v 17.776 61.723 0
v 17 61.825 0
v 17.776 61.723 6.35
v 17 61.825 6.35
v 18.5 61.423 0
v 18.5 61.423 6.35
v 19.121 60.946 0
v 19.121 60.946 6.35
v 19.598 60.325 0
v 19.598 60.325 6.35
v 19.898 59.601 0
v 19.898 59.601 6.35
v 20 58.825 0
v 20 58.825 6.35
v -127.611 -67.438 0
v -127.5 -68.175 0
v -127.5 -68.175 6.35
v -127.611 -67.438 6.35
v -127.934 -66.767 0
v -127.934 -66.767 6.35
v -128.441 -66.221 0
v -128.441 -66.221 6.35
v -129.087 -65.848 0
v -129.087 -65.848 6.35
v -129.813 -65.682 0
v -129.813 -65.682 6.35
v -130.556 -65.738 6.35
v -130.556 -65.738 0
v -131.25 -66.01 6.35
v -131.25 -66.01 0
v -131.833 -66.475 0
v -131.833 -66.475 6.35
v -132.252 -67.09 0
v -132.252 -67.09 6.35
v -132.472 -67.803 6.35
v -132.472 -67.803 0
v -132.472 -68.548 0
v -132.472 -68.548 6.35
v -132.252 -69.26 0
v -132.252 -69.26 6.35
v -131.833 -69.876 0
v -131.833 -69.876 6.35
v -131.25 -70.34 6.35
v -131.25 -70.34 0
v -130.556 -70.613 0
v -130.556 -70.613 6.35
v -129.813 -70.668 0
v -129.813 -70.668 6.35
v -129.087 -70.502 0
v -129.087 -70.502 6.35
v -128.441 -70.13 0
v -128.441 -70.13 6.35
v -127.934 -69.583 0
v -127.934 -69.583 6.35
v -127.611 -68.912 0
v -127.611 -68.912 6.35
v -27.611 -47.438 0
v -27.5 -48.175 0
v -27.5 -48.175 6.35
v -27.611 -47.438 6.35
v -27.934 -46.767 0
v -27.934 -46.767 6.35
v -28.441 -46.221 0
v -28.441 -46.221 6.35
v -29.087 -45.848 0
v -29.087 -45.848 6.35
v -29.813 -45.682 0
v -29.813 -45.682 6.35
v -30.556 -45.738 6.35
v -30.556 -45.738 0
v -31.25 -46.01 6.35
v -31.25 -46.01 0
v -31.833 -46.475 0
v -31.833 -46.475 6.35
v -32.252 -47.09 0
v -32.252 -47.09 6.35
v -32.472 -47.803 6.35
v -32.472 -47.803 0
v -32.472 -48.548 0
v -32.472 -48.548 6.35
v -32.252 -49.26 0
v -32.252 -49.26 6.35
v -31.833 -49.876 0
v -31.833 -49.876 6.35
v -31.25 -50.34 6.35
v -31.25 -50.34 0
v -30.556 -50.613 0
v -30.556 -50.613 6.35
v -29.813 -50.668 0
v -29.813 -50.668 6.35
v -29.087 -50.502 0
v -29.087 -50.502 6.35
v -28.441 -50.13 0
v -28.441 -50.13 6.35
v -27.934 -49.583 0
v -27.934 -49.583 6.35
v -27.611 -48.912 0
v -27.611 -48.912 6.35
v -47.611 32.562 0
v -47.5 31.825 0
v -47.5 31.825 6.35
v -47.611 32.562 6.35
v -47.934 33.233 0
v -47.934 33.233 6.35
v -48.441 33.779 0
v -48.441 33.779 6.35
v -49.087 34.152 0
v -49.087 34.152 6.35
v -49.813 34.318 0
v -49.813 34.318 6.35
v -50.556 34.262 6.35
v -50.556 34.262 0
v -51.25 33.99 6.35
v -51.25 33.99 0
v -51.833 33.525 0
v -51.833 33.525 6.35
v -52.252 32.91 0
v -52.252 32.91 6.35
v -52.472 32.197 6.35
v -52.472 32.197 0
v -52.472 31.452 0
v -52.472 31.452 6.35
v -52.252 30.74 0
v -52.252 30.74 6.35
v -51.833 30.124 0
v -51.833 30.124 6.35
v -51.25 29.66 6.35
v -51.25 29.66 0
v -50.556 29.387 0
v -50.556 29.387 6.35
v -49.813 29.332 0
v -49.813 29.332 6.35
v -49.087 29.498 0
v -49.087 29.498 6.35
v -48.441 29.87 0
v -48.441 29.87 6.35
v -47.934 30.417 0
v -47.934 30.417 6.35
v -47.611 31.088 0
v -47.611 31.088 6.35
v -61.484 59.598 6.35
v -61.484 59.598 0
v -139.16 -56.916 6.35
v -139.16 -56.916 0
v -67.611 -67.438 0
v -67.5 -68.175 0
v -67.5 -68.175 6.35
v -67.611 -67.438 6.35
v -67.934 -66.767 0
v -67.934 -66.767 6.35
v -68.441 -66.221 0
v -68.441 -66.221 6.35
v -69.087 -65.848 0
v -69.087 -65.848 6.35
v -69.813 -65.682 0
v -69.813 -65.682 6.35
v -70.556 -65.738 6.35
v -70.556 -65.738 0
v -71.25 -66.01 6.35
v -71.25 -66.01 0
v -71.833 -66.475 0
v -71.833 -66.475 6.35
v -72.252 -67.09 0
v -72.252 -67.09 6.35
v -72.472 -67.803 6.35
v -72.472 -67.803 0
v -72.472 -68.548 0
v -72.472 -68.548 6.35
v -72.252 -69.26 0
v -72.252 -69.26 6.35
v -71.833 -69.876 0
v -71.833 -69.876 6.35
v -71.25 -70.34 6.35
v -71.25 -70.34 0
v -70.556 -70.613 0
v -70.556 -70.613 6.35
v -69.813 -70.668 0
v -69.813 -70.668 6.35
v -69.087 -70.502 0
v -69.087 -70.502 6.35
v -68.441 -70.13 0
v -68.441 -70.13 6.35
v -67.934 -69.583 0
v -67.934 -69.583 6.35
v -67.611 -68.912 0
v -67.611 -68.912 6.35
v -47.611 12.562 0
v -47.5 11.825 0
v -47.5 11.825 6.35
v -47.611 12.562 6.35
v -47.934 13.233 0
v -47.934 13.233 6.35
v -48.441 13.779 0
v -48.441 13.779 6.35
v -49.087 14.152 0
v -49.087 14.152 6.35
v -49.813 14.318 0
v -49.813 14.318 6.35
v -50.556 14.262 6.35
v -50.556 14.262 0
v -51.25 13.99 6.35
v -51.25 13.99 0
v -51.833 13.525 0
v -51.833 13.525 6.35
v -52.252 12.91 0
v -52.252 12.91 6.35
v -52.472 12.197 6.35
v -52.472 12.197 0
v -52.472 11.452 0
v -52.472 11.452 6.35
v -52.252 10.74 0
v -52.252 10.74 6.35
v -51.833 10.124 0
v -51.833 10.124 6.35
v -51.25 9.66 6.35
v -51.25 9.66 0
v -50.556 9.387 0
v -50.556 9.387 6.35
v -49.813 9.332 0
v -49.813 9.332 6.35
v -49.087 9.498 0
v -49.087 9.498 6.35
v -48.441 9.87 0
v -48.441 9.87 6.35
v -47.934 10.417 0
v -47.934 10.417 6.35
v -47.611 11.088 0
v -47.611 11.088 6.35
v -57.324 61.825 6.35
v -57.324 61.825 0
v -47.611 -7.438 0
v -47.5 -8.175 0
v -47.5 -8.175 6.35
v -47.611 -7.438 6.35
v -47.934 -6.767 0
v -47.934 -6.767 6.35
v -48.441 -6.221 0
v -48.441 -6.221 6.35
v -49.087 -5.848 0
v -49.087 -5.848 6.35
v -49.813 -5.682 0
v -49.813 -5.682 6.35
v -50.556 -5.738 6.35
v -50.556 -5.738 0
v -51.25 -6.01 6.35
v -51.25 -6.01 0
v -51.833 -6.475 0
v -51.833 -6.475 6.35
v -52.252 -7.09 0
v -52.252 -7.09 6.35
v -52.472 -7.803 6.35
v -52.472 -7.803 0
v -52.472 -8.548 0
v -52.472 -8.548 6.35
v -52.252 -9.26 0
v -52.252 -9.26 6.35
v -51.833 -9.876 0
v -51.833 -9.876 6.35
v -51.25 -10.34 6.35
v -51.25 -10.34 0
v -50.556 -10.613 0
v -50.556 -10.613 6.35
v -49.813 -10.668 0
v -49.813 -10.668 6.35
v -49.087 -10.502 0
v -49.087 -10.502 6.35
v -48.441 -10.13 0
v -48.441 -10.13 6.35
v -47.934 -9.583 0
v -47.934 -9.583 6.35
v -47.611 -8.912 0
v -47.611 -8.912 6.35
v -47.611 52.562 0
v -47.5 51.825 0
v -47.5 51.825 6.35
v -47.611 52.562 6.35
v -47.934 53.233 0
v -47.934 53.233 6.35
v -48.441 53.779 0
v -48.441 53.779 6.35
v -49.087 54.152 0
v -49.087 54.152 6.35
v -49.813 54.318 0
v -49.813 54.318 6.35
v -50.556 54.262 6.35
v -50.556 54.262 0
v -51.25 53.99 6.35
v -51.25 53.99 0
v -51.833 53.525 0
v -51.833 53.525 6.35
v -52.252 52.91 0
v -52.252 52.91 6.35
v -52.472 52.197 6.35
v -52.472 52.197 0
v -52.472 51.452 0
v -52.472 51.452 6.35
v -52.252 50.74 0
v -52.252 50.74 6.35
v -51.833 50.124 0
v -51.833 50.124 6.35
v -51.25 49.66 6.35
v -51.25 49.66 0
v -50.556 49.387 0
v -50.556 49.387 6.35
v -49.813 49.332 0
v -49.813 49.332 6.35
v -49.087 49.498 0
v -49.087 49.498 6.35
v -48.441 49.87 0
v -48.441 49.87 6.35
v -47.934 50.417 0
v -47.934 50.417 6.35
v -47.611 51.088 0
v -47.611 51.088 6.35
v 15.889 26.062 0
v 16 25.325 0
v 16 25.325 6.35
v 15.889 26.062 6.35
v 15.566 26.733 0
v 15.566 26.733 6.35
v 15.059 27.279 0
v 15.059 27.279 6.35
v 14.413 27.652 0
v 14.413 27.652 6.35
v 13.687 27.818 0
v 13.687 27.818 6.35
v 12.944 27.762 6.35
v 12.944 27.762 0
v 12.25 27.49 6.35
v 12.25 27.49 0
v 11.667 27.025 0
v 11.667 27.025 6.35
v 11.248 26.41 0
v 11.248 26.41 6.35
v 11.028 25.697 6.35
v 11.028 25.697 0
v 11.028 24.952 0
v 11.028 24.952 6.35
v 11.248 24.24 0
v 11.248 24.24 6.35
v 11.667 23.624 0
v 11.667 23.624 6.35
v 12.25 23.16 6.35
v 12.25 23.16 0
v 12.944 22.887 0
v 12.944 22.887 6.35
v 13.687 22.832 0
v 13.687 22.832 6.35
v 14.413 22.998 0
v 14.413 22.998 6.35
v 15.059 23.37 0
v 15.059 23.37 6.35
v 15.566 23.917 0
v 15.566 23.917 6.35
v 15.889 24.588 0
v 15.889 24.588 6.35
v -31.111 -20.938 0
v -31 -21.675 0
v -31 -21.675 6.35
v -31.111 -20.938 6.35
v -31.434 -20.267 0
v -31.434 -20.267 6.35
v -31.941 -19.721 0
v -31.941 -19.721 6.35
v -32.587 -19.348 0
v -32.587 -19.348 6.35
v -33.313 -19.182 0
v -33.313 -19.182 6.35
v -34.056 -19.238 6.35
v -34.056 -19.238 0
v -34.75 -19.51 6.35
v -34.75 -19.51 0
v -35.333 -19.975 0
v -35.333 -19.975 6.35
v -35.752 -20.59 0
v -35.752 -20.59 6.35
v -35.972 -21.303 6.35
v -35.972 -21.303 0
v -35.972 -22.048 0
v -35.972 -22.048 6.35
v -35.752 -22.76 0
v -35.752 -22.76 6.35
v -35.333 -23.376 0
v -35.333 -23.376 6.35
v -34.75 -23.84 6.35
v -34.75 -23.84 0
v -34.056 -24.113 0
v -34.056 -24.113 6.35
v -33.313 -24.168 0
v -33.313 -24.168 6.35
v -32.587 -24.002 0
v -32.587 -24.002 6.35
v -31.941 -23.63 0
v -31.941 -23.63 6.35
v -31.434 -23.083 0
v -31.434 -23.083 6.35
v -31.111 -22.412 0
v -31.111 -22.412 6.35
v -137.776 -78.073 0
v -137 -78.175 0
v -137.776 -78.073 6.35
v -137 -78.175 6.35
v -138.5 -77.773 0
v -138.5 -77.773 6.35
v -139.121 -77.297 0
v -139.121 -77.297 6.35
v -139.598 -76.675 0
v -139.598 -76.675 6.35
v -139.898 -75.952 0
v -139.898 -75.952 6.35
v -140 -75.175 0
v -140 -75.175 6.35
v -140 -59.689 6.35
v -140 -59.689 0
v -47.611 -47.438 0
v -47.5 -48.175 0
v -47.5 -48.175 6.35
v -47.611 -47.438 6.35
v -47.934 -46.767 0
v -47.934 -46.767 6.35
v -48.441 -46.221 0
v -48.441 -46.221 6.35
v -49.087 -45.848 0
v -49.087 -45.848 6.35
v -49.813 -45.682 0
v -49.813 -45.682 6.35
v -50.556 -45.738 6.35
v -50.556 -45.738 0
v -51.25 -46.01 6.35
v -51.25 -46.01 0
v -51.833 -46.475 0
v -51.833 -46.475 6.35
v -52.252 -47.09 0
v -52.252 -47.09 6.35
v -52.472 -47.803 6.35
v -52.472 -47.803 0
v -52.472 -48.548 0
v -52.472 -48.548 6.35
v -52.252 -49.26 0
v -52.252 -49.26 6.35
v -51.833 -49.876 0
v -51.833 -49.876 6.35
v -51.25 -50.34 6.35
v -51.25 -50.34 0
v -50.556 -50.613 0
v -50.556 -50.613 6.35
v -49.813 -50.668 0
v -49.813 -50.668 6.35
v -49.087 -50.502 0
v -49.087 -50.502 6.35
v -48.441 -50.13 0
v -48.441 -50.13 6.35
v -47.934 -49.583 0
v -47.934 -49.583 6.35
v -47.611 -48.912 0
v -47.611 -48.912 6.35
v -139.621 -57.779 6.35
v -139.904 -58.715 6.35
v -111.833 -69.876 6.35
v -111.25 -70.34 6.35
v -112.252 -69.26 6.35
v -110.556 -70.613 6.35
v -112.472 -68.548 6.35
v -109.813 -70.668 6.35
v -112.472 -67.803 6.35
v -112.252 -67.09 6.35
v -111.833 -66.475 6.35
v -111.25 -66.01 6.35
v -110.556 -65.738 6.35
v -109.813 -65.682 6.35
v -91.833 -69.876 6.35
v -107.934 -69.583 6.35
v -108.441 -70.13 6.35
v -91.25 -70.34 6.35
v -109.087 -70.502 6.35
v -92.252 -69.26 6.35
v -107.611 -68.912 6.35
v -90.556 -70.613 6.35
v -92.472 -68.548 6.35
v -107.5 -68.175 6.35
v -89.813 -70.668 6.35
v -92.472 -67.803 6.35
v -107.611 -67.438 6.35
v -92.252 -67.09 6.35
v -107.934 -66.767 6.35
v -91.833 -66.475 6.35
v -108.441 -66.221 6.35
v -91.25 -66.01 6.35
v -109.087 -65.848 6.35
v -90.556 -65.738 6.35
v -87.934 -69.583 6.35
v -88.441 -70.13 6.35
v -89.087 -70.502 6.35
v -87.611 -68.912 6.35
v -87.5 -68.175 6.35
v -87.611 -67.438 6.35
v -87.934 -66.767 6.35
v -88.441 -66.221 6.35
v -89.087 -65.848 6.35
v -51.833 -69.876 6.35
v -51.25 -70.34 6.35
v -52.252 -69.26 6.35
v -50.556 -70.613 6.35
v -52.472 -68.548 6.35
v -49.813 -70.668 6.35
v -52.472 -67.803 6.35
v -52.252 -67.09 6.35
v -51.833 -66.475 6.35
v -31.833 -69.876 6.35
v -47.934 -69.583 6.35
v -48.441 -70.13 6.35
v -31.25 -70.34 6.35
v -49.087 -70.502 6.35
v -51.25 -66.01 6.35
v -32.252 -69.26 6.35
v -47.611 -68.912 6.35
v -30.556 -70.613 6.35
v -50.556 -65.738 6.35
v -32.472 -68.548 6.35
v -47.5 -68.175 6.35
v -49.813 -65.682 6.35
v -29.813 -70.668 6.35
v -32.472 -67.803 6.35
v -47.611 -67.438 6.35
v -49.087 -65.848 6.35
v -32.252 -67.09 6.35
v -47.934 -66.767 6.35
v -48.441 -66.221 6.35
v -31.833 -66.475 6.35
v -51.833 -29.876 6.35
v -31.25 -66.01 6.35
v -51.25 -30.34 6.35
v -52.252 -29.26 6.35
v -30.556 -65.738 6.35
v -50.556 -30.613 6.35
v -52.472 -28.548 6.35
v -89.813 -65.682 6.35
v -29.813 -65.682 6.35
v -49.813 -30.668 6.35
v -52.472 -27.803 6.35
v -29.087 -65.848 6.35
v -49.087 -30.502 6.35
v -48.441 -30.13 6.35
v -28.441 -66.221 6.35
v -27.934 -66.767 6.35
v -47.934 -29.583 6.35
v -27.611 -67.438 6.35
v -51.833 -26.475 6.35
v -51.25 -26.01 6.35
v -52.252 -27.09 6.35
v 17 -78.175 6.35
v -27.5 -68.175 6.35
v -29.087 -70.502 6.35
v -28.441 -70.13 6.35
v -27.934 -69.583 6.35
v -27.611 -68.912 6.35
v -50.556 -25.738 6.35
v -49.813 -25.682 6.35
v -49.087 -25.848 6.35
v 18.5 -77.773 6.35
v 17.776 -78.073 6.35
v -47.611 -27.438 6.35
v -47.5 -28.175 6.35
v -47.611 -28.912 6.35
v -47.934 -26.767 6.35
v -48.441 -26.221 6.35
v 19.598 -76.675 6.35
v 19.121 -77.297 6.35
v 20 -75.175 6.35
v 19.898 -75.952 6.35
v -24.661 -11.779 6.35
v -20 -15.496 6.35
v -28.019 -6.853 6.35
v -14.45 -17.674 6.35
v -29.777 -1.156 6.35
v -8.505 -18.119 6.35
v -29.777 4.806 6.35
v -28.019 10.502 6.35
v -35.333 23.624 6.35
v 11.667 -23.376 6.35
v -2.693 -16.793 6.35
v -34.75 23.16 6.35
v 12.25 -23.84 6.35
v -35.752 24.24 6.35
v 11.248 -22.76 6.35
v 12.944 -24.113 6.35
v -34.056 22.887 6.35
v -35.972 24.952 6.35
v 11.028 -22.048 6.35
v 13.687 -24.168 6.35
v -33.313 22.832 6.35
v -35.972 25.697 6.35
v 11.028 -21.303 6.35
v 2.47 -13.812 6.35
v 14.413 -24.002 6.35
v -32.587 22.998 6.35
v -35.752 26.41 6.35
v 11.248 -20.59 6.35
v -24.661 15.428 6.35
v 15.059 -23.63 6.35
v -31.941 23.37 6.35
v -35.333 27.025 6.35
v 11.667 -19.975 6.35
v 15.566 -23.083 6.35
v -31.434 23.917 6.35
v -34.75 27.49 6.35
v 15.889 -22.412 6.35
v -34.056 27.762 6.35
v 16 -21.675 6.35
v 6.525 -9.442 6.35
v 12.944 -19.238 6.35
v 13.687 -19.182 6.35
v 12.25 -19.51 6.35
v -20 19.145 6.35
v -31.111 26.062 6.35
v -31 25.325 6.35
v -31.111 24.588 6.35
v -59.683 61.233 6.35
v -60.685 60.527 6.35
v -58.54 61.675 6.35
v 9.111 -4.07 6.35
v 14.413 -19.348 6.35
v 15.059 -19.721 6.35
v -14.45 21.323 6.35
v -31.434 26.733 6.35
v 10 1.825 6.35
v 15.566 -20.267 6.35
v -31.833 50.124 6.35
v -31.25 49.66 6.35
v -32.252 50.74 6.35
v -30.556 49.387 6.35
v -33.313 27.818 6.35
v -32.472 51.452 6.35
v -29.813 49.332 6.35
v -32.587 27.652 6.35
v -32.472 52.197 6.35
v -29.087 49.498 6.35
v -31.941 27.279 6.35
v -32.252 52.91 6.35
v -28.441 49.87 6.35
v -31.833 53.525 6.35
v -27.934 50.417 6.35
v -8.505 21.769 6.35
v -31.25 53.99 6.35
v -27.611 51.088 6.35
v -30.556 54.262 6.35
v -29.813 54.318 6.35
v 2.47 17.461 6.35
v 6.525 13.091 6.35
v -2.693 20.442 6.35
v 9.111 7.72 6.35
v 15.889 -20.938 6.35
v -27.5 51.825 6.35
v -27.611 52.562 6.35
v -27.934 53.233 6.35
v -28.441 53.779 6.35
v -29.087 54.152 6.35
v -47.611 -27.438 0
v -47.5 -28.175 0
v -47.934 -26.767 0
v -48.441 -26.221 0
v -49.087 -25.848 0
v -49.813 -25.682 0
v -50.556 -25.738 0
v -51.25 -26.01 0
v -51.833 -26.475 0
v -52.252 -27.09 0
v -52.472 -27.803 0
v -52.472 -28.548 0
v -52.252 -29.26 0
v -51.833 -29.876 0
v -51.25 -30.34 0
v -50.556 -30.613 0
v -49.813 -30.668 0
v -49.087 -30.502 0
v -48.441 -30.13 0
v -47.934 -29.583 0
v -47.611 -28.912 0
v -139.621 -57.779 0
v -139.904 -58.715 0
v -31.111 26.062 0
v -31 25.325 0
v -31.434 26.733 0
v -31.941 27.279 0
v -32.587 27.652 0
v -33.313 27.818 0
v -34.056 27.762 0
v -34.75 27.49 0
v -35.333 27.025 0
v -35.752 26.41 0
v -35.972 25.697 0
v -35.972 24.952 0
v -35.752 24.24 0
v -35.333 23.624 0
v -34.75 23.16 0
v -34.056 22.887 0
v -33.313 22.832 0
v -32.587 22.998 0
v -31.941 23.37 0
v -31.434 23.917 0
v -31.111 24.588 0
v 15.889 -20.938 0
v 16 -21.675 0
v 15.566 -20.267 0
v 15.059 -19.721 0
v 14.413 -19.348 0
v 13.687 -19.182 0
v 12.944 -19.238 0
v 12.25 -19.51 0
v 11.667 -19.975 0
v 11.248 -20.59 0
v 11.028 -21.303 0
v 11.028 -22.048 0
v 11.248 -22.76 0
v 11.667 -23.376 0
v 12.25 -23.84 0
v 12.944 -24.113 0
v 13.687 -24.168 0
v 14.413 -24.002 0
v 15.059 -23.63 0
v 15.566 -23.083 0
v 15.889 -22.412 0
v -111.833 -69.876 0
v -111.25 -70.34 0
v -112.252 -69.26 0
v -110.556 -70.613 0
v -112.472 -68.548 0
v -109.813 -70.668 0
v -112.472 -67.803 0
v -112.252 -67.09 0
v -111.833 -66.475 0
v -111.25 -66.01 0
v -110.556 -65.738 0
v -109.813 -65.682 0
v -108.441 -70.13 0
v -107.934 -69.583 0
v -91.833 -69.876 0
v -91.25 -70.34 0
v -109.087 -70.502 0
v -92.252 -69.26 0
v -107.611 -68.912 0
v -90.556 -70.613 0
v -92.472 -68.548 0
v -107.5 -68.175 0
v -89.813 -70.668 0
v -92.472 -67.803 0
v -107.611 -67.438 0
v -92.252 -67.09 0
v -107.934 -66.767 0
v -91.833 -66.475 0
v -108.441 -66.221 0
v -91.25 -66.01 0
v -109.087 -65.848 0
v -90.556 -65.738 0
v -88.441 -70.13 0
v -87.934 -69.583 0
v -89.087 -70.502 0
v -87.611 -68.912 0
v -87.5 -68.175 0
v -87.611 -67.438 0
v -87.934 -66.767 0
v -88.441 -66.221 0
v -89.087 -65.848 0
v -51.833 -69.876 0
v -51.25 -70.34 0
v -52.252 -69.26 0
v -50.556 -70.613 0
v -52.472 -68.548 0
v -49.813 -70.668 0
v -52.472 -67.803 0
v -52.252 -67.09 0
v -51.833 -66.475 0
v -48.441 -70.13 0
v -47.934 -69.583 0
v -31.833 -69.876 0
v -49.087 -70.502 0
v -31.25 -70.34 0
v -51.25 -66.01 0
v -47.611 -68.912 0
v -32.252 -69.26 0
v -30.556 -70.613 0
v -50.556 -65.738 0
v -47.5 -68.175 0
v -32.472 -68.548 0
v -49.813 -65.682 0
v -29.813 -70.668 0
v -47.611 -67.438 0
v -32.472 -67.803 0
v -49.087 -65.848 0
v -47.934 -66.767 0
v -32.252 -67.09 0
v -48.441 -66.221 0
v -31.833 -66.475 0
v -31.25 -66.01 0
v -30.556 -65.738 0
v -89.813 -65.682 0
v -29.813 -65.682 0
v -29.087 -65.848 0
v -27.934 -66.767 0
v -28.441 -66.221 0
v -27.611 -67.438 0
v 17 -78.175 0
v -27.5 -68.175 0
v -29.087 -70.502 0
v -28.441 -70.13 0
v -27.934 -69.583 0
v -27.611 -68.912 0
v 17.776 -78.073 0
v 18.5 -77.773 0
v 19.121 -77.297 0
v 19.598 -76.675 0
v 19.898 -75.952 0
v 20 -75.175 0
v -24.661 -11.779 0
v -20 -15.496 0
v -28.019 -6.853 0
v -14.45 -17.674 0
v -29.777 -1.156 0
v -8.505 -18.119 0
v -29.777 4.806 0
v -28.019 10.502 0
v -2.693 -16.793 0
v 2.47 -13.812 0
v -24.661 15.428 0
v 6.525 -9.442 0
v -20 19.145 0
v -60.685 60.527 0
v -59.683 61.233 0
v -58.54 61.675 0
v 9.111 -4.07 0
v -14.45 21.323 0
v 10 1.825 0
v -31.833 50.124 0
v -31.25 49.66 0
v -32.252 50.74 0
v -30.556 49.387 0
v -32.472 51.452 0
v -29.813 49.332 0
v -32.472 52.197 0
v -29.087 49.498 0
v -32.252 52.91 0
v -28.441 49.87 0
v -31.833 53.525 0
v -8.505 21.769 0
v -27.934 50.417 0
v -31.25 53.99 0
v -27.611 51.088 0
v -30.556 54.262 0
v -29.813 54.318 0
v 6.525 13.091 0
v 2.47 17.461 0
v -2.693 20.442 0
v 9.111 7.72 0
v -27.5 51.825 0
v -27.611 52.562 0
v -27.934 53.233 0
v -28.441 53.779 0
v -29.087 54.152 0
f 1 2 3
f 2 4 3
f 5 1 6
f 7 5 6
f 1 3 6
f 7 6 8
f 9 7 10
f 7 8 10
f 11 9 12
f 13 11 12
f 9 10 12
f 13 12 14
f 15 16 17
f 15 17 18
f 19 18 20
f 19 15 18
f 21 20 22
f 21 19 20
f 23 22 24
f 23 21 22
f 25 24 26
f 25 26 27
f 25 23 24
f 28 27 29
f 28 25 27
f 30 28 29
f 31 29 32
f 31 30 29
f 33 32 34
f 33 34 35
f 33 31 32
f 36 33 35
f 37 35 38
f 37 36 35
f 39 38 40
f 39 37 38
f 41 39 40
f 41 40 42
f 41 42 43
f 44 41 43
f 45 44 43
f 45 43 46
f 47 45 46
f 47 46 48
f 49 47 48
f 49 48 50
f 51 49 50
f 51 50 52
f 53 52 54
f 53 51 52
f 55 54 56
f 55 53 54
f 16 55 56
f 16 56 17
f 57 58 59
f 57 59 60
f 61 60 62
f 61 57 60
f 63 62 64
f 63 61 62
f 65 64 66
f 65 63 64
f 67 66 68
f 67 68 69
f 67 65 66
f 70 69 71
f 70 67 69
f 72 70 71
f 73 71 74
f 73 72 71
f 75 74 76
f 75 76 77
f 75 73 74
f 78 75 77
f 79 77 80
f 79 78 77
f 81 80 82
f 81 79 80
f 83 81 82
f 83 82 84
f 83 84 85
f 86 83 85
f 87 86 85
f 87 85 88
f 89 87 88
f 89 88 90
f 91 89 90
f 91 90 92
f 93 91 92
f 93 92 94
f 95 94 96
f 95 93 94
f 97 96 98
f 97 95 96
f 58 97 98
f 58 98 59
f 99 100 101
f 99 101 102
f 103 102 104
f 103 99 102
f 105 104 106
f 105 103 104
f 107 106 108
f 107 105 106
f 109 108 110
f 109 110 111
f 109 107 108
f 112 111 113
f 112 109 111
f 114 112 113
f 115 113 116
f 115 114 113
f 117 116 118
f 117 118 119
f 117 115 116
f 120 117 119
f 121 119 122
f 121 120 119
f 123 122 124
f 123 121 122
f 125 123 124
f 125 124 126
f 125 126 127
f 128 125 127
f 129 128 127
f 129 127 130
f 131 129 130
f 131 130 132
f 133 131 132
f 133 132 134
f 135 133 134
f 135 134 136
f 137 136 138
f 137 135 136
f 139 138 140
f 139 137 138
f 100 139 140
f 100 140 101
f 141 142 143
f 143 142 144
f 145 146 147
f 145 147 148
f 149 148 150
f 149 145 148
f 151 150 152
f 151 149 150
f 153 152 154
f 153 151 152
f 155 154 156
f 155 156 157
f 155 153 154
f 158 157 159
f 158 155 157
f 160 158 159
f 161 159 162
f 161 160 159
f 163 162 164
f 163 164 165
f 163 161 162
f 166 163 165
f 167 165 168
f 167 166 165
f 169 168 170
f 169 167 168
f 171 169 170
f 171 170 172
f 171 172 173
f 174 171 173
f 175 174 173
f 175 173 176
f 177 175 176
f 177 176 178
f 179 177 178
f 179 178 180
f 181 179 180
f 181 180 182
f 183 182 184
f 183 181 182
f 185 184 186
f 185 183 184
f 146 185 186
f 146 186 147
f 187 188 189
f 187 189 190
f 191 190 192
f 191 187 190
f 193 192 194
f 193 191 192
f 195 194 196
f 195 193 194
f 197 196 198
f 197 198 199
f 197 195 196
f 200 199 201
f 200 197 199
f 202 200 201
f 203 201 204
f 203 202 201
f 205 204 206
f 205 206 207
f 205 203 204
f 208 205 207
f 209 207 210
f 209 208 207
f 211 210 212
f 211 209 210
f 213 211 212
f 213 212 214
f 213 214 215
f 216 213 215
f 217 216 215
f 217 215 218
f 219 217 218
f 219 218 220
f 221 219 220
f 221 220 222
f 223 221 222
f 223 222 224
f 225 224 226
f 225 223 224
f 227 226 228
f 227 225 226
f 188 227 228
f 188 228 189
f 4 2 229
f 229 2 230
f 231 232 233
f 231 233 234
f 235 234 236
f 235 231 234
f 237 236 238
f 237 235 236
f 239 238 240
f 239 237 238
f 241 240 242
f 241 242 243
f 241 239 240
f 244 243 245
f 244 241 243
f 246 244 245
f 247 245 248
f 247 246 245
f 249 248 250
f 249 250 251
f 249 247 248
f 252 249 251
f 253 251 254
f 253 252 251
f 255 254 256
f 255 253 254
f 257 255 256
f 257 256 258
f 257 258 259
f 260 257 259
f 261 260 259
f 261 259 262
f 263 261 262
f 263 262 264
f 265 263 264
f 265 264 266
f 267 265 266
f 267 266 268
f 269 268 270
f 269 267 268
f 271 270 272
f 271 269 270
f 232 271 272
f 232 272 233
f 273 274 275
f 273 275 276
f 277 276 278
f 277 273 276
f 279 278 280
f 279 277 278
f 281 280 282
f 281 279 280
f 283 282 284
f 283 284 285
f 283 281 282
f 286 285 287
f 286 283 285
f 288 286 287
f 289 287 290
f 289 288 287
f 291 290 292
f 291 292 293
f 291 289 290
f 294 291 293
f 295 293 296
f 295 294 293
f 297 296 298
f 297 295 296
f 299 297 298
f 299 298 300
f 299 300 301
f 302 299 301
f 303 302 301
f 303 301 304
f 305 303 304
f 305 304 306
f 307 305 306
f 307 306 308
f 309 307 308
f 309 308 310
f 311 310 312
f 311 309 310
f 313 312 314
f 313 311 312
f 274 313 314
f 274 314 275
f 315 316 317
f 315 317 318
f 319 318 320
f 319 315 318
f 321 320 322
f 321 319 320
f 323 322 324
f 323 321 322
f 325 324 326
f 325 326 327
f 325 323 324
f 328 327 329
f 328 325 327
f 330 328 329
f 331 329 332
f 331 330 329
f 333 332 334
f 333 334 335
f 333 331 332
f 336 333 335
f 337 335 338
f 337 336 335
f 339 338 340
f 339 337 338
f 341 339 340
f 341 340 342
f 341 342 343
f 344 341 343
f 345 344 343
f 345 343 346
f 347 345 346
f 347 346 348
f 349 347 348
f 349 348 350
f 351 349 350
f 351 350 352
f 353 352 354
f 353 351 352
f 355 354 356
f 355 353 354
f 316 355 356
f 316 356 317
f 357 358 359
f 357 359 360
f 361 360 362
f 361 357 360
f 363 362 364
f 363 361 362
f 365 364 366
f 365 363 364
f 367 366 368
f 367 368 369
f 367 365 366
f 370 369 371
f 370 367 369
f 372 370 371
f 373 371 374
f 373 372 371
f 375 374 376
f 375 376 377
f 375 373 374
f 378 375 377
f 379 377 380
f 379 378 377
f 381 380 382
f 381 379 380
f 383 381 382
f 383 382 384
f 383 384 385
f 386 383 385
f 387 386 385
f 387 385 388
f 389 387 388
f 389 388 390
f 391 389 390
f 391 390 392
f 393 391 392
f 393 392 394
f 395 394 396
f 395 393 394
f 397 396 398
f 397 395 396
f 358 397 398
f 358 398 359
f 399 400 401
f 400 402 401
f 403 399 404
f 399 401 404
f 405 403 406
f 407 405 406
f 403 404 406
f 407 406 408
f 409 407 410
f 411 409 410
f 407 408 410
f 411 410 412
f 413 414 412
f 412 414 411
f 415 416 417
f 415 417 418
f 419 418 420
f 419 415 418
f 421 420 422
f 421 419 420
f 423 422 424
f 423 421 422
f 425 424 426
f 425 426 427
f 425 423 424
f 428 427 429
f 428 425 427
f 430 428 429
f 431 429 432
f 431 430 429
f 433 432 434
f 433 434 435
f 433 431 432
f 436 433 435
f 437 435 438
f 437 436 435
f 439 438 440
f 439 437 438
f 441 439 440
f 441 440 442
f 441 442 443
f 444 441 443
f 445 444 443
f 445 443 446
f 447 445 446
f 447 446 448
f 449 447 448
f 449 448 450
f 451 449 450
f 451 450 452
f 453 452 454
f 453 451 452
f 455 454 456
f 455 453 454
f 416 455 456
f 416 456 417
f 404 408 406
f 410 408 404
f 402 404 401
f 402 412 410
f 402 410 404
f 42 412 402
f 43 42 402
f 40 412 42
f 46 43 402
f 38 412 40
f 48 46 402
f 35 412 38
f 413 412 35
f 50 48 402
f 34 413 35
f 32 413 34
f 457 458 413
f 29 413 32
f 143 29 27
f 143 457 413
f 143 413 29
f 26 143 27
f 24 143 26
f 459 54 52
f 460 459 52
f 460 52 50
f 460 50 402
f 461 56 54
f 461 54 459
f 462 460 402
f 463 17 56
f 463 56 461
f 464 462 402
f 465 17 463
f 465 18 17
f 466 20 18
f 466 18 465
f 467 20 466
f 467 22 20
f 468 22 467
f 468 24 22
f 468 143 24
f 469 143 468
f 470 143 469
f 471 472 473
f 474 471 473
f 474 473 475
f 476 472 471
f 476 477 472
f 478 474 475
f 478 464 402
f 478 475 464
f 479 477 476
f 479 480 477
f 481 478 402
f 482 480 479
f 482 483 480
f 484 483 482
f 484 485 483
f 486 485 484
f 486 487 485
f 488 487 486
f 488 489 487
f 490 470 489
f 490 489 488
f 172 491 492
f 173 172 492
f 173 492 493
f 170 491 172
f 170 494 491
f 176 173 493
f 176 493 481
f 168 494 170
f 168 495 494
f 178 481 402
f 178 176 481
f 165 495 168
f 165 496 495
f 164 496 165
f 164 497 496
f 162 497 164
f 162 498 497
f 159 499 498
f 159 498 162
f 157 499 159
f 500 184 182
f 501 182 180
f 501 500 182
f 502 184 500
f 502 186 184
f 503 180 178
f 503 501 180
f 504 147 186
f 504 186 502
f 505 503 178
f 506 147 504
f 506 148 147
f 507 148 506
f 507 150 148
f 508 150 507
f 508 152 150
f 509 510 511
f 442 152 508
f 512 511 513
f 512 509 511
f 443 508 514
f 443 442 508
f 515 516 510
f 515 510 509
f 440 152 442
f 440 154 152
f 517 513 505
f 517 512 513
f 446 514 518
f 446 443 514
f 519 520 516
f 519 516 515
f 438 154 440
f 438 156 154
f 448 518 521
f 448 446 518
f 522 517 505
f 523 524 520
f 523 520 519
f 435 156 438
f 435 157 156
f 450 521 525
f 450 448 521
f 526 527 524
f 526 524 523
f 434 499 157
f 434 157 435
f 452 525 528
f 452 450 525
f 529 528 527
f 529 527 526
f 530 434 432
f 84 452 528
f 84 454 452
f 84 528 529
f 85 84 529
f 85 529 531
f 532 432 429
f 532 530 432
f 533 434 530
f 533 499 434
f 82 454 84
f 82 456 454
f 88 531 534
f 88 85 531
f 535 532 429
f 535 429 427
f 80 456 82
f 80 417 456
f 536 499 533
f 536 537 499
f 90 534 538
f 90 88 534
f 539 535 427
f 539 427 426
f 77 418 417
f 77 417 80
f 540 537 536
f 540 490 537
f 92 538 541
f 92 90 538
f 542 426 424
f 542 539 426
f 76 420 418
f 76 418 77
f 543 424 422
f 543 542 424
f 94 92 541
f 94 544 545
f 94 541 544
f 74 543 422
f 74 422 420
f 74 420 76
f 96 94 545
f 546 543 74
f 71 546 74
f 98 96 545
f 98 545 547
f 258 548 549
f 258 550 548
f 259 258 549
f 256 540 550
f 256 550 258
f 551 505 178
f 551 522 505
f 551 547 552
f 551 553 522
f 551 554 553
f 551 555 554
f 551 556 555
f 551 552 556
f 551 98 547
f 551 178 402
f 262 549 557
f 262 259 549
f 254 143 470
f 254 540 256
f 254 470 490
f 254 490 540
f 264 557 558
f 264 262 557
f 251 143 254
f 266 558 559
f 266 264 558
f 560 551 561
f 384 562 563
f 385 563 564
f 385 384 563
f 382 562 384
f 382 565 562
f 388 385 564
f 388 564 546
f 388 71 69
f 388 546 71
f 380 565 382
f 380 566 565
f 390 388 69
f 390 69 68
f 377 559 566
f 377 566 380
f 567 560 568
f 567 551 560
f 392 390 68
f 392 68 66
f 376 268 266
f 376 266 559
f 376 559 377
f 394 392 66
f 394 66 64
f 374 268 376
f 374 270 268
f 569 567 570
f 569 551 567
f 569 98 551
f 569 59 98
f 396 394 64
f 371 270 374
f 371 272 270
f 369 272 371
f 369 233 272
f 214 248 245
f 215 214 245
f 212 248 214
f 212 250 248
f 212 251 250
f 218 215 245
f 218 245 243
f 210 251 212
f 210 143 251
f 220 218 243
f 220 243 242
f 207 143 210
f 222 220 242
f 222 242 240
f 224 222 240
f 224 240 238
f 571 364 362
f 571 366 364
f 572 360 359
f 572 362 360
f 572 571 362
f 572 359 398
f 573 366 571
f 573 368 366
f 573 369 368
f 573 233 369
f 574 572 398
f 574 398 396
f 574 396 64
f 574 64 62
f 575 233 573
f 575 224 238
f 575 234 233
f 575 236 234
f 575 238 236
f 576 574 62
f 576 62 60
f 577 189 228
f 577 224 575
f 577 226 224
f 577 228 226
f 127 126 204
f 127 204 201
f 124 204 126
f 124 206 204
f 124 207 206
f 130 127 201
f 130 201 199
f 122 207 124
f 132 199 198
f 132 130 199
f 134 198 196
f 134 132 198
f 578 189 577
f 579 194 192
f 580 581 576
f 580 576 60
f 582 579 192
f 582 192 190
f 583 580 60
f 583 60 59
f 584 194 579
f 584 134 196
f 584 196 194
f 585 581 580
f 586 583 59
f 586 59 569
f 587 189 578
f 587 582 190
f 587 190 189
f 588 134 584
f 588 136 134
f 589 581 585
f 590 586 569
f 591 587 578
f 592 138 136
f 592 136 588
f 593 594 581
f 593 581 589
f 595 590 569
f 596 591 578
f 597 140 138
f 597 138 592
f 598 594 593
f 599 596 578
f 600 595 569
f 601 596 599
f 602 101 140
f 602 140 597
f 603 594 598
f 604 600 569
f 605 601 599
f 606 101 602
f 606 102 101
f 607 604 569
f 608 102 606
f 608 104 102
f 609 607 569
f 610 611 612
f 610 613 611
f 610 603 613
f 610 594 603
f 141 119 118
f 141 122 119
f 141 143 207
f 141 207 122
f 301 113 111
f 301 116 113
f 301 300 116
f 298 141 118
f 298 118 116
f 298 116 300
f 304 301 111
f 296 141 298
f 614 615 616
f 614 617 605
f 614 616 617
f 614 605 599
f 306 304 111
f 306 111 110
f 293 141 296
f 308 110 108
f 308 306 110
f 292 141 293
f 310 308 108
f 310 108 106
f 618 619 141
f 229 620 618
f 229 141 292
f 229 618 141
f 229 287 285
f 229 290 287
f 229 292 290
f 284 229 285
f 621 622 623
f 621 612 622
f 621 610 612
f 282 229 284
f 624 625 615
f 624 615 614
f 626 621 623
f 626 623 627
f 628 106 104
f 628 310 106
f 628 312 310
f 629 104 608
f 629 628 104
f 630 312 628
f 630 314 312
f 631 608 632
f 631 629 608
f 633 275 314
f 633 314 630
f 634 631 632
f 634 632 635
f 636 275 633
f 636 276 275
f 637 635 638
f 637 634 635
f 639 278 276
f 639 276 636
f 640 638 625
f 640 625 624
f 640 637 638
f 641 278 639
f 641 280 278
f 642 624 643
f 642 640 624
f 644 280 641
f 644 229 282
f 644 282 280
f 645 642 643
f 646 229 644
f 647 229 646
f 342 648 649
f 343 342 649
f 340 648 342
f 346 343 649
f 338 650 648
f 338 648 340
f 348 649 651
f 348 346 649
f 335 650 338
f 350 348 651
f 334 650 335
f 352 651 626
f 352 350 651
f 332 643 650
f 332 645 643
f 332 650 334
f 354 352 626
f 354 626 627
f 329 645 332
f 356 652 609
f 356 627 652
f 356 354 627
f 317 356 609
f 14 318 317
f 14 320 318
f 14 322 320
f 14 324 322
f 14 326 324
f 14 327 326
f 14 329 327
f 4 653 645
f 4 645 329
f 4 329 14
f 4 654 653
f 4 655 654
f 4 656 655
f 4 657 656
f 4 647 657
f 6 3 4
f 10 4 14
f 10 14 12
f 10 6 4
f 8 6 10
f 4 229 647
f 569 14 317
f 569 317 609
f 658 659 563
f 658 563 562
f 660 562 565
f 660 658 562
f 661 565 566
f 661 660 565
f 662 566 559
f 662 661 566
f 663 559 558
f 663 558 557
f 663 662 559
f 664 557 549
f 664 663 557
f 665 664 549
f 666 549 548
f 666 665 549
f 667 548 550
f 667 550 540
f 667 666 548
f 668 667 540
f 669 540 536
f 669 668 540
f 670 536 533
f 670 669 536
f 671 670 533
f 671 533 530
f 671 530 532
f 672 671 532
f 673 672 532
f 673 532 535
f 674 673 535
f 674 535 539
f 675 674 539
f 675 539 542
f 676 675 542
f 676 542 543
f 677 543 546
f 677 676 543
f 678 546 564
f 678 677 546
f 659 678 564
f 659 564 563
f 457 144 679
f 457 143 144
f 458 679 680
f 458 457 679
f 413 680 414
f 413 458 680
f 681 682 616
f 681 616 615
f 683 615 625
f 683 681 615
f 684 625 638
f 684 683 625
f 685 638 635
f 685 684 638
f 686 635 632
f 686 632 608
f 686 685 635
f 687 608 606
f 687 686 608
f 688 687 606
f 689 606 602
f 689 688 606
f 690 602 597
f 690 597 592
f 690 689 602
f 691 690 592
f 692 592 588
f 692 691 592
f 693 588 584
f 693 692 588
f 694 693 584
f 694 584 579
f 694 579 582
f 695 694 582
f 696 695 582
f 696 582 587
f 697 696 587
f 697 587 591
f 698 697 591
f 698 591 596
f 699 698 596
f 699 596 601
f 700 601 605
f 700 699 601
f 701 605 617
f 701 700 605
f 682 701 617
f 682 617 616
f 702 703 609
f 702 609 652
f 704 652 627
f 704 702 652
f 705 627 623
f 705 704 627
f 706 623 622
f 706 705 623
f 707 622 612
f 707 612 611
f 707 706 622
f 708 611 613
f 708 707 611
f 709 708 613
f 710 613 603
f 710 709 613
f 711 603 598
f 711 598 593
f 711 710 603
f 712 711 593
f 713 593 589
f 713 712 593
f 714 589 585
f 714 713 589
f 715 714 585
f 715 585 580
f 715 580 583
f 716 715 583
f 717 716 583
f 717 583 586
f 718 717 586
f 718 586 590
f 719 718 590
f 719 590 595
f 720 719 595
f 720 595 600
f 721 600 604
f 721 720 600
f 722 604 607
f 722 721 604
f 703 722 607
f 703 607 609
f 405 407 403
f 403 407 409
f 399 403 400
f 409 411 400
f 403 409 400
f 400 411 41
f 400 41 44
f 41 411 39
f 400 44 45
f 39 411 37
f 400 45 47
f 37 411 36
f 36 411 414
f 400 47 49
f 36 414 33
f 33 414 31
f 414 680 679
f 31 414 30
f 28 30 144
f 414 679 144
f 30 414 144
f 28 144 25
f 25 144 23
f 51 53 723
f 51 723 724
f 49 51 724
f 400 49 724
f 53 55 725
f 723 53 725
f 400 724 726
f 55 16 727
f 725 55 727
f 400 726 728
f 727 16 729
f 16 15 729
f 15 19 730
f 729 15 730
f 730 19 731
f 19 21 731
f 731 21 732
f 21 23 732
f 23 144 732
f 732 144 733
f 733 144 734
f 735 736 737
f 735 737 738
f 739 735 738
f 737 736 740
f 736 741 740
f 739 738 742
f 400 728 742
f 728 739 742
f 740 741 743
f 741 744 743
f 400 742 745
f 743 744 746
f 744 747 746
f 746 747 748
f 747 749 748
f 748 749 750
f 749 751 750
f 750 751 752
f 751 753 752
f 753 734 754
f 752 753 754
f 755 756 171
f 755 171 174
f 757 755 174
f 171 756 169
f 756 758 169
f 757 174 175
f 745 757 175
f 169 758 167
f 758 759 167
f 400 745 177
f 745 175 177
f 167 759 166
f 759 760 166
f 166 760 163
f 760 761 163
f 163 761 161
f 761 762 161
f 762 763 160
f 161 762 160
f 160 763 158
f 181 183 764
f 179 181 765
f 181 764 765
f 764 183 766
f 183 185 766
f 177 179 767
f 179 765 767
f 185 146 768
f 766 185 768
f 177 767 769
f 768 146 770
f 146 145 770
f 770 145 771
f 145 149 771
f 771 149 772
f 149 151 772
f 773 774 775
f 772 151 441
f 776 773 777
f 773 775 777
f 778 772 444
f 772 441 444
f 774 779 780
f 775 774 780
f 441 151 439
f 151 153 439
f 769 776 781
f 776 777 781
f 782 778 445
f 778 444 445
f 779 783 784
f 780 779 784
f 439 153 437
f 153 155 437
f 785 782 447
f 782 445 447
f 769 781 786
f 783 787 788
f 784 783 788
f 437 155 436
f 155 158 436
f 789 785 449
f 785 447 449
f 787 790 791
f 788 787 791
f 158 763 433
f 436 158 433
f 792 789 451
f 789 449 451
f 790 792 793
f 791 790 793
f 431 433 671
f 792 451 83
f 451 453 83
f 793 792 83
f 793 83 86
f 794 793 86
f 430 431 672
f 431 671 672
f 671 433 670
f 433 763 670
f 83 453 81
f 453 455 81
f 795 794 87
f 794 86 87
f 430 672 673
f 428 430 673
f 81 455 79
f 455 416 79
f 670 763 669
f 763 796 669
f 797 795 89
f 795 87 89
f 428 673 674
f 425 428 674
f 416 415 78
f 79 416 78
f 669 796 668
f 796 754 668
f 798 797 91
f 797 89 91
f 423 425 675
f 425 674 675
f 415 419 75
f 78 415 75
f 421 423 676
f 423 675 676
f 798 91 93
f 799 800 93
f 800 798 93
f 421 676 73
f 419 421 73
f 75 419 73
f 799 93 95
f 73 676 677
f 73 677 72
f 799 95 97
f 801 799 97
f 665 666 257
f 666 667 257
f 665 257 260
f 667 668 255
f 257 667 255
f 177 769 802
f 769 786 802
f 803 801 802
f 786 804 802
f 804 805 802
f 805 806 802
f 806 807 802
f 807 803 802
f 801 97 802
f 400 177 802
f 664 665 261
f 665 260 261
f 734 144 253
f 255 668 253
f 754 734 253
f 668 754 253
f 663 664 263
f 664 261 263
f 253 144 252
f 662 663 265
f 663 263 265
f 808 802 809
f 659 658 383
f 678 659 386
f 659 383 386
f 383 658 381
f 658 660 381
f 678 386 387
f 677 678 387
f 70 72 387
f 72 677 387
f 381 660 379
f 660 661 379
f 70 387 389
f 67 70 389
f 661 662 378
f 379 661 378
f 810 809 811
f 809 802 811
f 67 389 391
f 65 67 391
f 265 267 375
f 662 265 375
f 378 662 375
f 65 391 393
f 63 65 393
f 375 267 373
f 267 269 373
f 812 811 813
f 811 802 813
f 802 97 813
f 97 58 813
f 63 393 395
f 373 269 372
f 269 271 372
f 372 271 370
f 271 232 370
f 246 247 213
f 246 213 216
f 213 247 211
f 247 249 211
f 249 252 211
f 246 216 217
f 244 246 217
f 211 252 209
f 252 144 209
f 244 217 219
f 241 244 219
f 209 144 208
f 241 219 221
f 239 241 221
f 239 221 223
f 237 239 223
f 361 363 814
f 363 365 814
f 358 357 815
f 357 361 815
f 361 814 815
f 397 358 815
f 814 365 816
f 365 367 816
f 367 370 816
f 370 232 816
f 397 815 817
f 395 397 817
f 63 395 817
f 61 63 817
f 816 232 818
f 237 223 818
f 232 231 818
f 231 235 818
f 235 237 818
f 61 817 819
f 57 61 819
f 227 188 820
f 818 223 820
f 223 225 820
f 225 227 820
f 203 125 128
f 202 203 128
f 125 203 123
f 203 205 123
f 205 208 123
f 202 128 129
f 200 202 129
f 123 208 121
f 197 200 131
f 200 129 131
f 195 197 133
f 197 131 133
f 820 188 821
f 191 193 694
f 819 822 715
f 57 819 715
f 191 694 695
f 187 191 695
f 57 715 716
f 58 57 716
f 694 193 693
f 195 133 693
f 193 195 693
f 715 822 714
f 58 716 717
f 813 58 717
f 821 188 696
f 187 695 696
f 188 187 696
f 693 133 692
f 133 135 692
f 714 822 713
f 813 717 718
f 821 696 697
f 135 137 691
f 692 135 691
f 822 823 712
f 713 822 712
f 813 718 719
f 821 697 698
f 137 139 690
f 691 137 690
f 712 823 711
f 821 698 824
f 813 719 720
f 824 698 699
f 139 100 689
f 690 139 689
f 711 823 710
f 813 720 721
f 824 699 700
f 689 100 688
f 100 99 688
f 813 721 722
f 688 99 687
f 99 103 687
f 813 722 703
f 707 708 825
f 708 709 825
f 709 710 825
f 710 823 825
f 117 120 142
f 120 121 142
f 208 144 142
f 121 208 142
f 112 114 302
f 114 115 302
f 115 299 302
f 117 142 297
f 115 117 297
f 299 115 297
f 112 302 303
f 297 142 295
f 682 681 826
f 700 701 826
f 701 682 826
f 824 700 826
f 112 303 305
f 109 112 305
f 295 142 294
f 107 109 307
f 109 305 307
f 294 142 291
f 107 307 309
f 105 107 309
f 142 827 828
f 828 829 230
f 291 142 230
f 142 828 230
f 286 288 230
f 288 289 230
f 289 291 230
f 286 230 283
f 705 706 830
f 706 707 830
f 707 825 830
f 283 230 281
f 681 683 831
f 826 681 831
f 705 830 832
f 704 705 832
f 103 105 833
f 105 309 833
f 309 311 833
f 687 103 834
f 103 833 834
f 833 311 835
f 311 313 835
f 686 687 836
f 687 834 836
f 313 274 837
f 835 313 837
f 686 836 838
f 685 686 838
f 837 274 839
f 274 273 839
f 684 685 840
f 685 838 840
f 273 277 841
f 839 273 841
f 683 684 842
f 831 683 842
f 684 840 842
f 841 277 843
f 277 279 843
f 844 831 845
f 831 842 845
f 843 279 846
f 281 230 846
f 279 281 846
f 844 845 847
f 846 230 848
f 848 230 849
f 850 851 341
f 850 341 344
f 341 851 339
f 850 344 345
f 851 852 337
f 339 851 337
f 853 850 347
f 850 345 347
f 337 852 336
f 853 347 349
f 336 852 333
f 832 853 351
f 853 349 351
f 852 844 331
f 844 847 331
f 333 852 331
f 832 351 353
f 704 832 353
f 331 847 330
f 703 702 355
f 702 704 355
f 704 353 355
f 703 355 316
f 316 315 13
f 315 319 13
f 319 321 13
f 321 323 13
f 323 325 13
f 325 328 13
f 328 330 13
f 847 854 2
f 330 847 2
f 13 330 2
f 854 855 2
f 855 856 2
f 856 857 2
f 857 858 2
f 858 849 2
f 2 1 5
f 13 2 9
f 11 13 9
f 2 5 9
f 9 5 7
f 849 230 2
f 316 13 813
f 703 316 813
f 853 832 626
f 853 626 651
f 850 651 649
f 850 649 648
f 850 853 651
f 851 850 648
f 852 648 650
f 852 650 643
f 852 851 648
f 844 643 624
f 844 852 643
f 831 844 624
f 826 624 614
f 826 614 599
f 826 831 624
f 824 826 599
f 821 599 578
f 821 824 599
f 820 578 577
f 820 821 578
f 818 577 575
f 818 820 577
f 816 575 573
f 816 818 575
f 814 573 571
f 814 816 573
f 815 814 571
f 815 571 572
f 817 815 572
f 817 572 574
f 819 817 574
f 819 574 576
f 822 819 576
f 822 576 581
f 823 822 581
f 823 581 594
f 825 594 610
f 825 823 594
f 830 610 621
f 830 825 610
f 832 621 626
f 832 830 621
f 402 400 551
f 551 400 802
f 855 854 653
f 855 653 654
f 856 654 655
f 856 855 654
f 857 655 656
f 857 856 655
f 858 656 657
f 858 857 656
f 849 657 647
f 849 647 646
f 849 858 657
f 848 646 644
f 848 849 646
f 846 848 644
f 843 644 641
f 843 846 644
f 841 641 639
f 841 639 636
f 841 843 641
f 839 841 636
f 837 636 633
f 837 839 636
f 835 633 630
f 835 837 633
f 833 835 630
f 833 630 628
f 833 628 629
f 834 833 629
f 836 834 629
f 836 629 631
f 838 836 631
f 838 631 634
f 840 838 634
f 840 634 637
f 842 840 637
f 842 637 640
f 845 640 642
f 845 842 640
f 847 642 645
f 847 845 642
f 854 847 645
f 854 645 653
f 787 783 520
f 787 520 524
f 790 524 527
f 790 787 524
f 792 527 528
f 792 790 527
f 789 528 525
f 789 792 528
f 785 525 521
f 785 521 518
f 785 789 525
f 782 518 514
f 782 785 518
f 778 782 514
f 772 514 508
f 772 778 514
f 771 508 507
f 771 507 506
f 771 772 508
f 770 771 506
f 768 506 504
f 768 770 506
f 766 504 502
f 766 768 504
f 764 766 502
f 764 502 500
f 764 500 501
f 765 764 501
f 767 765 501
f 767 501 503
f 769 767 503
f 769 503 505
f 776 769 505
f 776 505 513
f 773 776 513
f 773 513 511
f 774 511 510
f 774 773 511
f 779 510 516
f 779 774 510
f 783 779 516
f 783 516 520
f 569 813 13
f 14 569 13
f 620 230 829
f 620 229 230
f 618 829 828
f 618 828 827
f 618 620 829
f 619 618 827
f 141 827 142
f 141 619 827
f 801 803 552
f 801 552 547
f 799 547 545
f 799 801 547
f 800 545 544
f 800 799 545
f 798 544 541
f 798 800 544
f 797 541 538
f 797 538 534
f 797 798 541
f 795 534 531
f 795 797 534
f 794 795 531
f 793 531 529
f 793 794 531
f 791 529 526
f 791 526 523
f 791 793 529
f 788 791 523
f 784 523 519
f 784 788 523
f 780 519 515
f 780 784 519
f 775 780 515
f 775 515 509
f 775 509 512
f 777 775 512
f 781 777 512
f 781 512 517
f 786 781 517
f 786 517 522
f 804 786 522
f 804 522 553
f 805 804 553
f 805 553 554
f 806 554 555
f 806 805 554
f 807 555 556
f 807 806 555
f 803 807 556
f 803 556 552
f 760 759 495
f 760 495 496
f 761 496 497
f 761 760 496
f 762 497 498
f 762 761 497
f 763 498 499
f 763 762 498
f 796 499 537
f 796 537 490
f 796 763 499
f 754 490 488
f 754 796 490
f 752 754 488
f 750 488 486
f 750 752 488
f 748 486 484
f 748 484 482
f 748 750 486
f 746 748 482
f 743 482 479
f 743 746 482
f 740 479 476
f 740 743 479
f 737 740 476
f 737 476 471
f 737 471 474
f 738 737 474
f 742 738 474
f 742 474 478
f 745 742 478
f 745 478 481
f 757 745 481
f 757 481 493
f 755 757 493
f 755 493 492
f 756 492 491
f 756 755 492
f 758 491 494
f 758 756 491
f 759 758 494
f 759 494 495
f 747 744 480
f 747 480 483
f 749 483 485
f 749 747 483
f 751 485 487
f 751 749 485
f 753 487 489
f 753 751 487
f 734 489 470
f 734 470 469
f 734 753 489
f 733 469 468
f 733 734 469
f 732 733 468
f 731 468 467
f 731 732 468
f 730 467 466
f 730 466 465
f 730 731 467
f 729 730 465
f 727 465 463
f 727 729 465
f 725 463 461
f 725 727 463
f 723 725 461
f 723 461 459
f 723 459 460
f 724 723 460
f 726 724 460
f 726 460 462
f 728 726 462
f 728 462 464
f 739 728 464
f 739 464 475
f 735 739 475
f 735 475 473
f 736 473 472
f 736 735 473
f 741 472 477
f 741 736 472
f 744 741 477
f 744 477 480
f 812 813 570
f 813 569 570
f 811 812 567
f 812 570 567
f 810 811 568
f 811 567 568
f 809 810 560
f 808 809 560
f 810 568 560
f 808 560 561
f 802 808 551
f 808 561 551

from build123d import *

# Parameters (mm, degrees)
SKETCH1_R           = 2.5
SKETCH1_R_2         = 20
BOSS_EXTRUDE1_DEPTH = 6.35
FILLET1_R           = 5
FILLET2_R           = 3


with BuildPart() as part:
    # Sketch1 → Boss-Extrude1 (new body)
    with BuildSketch(Plane.XY):
        Polygon((20, 61.824817518), (-60, 61.824817518), (-140, -58.175182482), (-140, -78.175182482), (20, -78.175182482), align=None)
        with Locations((-50, -48.175182482)):
            Circle(SKETCH1_R, mode=Mode.SUBTRACT)
        with Locations((-50, -28.175182482)):
            Circle(SKETCH1_R, mode=Mode.SUBTRACT)
        with Locations((-50, -8.175182482)):
            Circle(SKETCH1_R, mode=Mode.SUBTRACT)
        with Locations((-50, 11.824817518)):
            Circle(SKETCH1_R, mode=Mode.SUBTRACT)
        with Locations((-50, 31.824817518)):
            Circle(SKETCH1_R, mode=Mode.SUBTRACT)
        with Locations((-50, 51.824817518)):
            Circle(SKETCH1_R, mode=Mode.SUBTRACT)
        with Locations((-30, -48.175182482)):
            Circle(SKETCH1_R, mode=Mode.SUBTRACT)
        with Locations((-30, 51.824817518)):
            Circle(SKETCH1_R, mode=Mode.SUBTRACT)
        with Locations((-10, 1.824817518)):
            Circle(SKETCH1_R_2, mode=Mode.SUBTRACT)
        with Locations((-30, -68.175182482)):
            Circle(SKETCH1_R, mode=Mode.SUBTRACT)
        with Locations((-50, -68.175182482)):
            Circle(SKETCH1_R, mode=Mode.SUBTRACT)
        with Locations((-70, -68.175182482)):
            Circle(SKETCH1_R, mode=Mode.SUBTRACT)
        with Locations((-90, -68.175182482)):
            Circle(SKETCH1_R, mode=Mode.SUBTRACT)
        with Locations((-110, -68.175182482)):
            Circle(SKETCH1_R, mode=Mode.SUBTRACT)
        with Locations((-130, -68.175182482)):
            Circle(SKETCH1_R, mode=Mode.SUBTRACT)
        with Locations((-33.5, 25.324817518)):
            Circle(SKETCH1_R, mode=Mode.SUBTRACT)
        with Locations((13.5, 25.324817518)):
            Circle(SKETCH1_R, mode=Mode.SUBTRACT)
        with Locations((13.5, -21.675182482)):
            Circle(SKETCH1_R, mode=Mode.SUBTRACT)
        with Locations((-33.5, -21.675182482)):
            Circle(SKETCH1_R, mode=Mode.SUBTRACT)
    extrude(amount=BOSS_EXTRUDE1_DEPTH)

    # Fillet1
    fillet1_edges = [part.edges().sort_by_distance(p)[0] for p in [
        (-140, -58.175182482, 3.175),
        (-60, 61.824817518, 3.175),
    ]]
    fillet(fillet1_edges, radius=FILLET1_R)

    # Fillet2
    fillet2_edges = [part.edges().sort_by_distance(p)[0] for p in [
        (20, -78.175182482, 3.175),
        (-140, -78.175182482, 3.175),
        (20, 61.824817518, 3.175),
    ]]
    fillet(fillet2_edges, radius=FILLET2_R)


solid = part.part
